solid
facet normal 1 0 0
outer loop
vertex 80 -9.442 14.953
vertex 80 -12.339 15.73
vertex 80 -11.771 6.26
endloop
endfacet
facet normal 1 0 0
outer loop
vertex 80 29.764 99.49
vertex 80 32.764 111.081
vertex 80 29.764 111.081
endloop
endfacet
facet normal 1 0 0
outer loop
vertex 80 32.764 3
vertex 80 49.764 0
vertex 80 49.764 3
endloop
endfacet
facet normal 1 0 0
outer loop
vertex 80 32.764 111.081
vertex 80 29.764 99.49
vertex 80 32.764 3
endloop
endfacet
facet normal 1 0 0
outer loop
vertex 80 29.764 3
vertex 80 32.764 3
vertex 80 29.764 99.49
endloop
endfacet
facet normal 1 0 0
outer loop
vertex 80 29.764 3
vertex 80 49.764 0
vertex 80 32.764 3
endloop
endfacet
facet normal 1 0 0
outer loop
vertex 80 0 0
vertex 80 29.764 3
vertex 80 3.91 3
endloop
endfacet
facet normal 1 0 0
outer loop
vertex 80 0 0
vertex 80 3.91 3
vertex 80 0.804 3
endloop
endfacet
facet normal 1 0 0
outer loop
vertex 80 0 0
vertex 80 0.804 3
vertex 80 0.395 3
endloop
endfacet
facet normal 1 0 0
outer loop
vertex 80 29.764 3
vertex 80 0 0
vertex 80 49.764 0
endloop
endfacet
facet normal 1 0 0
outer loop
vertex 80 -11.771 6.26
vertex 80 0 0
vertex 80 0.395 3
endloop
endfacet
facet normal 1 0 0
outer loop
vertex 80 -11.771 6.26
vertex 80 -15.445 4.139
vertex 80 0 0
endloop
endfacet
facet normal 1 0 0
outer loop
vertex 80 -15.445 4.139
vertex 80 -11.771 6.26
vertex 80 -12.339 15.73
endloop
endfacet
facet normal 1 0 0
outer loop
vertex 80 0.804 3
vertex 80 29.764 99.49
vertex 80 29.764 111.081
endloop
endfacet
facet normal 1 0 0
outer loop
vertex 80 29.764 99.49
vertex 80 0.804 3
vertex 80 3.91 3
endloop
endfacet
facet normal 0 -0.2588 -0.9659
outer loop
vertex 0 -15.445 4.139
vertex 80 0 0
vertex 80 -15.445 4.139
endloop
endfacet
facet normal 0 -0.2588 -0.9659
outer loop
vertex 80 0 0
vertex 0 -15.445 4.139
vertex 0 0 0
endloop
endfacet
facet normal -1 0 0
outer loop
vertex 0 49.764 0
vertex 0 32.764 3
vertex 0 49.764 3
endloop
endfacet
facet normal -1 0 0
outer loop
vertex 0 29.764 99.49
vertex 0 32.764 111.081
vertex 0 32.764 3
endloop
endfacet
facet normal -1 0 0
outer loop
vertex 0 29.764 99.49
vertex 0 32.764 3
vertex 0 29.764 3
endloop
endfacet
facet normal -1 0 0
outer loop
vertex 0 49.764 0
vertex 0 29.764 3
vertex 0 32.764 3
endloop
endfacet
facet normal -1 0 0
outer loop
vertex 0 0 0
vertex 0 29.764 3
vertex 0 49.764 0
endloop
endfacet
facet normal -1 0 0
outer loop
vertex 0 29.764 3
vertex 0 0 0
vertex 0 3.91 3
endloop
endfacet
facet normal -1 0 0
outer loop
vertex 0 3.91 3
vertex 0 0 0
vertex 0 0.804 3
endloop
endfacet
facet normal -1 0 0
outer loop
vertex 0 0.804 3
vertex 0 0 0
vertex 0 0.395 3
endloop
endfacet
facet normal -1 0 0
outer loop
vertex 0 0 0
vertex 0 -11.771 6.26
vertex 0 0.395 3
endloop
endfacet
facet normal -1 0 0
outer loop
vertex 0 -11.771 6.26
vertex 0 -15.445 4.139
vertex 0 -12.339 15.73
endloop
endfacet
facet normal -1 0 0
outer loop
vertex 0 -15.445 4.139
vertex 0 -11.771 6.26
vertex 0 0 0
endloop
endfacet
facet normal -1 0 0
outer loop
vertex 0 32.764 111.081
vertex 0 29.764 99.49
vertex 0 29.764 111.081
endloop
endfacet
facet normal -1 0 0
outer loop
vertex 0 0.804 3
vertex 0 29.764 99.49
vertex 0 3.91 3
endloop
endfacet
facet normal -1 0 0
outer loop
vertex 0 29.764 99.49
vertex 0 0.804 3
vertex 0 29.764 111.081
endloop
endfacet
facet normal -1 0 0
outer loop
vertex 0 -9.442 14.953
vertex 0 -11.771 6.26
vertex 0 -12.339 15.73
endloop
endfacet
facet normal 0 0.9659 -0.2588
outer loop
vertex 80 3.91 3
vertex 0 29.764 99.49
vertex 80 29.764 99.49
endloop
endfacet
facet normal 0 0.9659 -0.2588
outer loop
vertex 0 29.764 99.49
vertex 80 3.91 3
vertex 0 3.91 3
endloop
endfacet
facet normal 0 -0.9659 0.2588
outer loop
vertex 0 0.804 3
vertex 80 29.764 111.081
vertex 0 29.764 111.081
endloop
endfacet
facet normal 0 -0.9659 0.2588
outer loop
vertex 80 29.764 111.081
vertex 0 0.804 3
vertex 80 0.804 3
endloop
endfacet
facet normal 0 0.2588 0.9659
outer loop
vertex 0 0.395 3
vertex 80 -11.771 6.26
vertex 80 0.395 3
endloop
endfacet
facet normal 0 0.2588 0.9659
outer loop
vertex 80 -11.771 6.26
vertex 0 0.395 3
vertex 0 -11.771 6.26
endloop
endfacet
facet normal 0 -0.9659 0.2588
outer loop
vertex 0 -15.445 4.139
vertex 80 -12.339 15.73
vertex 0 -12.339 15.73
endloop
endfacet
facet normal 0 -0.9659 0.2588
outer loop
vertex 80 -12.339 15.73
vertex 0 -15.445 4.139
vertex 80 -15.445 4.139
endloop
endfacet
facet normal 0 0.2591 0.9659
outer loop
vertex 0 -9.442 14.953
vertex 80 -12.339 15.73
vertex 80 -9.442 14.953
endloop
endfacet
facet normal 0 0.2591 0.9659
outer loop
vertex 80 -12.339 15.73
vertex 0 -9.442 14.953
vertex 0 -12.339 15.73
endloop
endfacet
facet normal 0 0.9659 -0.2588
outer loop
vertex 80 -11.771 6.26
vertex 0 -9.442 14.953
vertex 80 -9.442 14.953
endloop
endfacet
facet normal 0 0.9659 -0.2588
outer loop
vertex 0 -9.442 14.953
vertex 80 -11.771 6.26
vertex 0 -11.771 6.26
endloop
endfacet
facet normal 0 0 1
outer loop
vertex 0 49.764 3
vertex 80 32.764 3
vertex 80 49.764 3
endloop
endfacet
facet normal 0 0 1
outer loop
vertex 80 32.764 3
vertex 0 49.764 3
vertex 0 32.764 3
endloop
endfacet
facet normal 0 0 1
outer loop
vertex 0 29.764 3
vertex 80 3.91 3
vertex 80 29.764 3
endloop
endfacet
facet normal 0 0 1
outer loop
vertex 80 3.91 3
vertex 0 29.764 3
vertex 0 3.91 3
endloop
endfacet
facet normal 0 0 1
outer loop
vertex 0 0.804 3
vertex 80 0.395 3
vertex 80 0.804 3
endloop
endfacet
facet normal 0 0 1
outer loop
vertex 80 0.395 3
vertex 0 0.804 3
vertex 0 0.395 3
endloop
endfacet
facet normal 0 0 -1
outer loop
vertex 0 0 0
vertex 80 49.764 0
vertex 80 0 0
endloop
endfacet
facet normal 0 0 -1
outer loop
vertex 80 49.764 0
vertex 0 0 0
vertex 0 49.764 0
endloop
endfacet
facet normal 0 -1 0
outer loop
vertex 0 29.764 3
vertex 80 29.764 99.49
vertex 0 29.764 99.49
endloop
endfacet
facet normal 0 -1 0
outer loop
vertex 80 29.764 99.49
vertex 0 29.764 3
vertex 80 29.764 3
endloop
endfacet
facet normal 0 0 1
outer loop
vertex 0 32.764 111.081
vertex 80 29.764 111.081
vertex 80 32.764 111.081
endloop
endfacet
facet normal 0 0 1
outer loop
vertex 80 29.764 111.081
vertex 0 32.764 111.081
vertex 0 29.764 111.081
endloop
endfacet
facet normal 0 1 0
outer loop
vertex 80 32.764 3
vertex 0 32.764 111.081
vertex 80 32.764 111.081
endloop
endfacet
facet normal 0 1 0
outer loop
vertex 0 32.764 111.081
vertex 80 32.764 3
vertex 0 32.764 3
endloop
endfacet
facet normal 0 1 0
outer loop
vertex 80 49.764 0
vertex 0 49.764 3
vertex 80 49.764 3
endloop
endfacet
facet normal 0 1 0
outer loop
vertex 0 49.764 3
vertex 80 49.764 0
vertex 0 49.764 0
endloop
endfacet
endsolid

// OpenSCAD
// [FL_INDEX: keywords="openscad, 3d_parametric, Customizable_Universal_Stand, csg_solid" | COT="Parametric OpenSCAD design from 3DCodeverse"]
// Title: Customizable Universal Stand

//preview[view:south west, tilt:top diagonal]
stand_width = 80; //[20:100]
paper_thickness = 16; //[5:50]
paper_height = 115; //[50:300]
holdback_height = 12; //[5:50]
wall_thickness = 3; //[1:10]
fuzz = 0.01; 
//Paper angle
rotate_angle = 15; //[0:85]
rotate_a = -rotate_angle;
//extra part on the back to prevent tipping over
tail_length=20; //[0:100]
//IMPORTANT set this when exporting to STL (to print on its side !! supportless)
print_mode = "preview"; //[preview,print]

start();

module start(){
	if (print_mode == "preview"){
		difference(){
 			ding();
			//maak onderkant plat
			translate([-300,-300,-600]) cube([600,600,600]);
		}
	} else {
		rotate(-90,[0,1,0]){
			difference(){
 				ding();
				//maak onderkant plat
				translate([-300,-300,-600]) cube([600,600,600]);
			}
		}
	}
}

module ding(){
	rotate(rotate_a,[1,0,0]) a();
	b();
	c();
}

module a(){
	//back, papier leunt hier tegenaan
	cube([stand_width, wall_thickness,paper_height]);
	//bakje, papier staat hierop
	translate([0,-paper_thickness+fuzz,0]) cube([stand_width, paper_thickness, wall_thickness]);
	//holdback, dit houd tegen
	translate([0,-paper_thickness+fuzz,0]) cube([stand_width, wall_thickness,holdback_height]);
}

module b(){
	//onderkant
	cube([stand_width,sin(rotate_a*-1)*paper_height,wall_thickness]);
	//achterkant
	translate([0,sin(rotate_a*-1)*paper_height,0]) cube([stand_width,wall_thickness,cos(rotate_a*1)*paper_height]);
}

module c(){
	cube([stand_width,sin(rotate_a*-1)*paper_height+tail_length,wall_thickness]);
}
